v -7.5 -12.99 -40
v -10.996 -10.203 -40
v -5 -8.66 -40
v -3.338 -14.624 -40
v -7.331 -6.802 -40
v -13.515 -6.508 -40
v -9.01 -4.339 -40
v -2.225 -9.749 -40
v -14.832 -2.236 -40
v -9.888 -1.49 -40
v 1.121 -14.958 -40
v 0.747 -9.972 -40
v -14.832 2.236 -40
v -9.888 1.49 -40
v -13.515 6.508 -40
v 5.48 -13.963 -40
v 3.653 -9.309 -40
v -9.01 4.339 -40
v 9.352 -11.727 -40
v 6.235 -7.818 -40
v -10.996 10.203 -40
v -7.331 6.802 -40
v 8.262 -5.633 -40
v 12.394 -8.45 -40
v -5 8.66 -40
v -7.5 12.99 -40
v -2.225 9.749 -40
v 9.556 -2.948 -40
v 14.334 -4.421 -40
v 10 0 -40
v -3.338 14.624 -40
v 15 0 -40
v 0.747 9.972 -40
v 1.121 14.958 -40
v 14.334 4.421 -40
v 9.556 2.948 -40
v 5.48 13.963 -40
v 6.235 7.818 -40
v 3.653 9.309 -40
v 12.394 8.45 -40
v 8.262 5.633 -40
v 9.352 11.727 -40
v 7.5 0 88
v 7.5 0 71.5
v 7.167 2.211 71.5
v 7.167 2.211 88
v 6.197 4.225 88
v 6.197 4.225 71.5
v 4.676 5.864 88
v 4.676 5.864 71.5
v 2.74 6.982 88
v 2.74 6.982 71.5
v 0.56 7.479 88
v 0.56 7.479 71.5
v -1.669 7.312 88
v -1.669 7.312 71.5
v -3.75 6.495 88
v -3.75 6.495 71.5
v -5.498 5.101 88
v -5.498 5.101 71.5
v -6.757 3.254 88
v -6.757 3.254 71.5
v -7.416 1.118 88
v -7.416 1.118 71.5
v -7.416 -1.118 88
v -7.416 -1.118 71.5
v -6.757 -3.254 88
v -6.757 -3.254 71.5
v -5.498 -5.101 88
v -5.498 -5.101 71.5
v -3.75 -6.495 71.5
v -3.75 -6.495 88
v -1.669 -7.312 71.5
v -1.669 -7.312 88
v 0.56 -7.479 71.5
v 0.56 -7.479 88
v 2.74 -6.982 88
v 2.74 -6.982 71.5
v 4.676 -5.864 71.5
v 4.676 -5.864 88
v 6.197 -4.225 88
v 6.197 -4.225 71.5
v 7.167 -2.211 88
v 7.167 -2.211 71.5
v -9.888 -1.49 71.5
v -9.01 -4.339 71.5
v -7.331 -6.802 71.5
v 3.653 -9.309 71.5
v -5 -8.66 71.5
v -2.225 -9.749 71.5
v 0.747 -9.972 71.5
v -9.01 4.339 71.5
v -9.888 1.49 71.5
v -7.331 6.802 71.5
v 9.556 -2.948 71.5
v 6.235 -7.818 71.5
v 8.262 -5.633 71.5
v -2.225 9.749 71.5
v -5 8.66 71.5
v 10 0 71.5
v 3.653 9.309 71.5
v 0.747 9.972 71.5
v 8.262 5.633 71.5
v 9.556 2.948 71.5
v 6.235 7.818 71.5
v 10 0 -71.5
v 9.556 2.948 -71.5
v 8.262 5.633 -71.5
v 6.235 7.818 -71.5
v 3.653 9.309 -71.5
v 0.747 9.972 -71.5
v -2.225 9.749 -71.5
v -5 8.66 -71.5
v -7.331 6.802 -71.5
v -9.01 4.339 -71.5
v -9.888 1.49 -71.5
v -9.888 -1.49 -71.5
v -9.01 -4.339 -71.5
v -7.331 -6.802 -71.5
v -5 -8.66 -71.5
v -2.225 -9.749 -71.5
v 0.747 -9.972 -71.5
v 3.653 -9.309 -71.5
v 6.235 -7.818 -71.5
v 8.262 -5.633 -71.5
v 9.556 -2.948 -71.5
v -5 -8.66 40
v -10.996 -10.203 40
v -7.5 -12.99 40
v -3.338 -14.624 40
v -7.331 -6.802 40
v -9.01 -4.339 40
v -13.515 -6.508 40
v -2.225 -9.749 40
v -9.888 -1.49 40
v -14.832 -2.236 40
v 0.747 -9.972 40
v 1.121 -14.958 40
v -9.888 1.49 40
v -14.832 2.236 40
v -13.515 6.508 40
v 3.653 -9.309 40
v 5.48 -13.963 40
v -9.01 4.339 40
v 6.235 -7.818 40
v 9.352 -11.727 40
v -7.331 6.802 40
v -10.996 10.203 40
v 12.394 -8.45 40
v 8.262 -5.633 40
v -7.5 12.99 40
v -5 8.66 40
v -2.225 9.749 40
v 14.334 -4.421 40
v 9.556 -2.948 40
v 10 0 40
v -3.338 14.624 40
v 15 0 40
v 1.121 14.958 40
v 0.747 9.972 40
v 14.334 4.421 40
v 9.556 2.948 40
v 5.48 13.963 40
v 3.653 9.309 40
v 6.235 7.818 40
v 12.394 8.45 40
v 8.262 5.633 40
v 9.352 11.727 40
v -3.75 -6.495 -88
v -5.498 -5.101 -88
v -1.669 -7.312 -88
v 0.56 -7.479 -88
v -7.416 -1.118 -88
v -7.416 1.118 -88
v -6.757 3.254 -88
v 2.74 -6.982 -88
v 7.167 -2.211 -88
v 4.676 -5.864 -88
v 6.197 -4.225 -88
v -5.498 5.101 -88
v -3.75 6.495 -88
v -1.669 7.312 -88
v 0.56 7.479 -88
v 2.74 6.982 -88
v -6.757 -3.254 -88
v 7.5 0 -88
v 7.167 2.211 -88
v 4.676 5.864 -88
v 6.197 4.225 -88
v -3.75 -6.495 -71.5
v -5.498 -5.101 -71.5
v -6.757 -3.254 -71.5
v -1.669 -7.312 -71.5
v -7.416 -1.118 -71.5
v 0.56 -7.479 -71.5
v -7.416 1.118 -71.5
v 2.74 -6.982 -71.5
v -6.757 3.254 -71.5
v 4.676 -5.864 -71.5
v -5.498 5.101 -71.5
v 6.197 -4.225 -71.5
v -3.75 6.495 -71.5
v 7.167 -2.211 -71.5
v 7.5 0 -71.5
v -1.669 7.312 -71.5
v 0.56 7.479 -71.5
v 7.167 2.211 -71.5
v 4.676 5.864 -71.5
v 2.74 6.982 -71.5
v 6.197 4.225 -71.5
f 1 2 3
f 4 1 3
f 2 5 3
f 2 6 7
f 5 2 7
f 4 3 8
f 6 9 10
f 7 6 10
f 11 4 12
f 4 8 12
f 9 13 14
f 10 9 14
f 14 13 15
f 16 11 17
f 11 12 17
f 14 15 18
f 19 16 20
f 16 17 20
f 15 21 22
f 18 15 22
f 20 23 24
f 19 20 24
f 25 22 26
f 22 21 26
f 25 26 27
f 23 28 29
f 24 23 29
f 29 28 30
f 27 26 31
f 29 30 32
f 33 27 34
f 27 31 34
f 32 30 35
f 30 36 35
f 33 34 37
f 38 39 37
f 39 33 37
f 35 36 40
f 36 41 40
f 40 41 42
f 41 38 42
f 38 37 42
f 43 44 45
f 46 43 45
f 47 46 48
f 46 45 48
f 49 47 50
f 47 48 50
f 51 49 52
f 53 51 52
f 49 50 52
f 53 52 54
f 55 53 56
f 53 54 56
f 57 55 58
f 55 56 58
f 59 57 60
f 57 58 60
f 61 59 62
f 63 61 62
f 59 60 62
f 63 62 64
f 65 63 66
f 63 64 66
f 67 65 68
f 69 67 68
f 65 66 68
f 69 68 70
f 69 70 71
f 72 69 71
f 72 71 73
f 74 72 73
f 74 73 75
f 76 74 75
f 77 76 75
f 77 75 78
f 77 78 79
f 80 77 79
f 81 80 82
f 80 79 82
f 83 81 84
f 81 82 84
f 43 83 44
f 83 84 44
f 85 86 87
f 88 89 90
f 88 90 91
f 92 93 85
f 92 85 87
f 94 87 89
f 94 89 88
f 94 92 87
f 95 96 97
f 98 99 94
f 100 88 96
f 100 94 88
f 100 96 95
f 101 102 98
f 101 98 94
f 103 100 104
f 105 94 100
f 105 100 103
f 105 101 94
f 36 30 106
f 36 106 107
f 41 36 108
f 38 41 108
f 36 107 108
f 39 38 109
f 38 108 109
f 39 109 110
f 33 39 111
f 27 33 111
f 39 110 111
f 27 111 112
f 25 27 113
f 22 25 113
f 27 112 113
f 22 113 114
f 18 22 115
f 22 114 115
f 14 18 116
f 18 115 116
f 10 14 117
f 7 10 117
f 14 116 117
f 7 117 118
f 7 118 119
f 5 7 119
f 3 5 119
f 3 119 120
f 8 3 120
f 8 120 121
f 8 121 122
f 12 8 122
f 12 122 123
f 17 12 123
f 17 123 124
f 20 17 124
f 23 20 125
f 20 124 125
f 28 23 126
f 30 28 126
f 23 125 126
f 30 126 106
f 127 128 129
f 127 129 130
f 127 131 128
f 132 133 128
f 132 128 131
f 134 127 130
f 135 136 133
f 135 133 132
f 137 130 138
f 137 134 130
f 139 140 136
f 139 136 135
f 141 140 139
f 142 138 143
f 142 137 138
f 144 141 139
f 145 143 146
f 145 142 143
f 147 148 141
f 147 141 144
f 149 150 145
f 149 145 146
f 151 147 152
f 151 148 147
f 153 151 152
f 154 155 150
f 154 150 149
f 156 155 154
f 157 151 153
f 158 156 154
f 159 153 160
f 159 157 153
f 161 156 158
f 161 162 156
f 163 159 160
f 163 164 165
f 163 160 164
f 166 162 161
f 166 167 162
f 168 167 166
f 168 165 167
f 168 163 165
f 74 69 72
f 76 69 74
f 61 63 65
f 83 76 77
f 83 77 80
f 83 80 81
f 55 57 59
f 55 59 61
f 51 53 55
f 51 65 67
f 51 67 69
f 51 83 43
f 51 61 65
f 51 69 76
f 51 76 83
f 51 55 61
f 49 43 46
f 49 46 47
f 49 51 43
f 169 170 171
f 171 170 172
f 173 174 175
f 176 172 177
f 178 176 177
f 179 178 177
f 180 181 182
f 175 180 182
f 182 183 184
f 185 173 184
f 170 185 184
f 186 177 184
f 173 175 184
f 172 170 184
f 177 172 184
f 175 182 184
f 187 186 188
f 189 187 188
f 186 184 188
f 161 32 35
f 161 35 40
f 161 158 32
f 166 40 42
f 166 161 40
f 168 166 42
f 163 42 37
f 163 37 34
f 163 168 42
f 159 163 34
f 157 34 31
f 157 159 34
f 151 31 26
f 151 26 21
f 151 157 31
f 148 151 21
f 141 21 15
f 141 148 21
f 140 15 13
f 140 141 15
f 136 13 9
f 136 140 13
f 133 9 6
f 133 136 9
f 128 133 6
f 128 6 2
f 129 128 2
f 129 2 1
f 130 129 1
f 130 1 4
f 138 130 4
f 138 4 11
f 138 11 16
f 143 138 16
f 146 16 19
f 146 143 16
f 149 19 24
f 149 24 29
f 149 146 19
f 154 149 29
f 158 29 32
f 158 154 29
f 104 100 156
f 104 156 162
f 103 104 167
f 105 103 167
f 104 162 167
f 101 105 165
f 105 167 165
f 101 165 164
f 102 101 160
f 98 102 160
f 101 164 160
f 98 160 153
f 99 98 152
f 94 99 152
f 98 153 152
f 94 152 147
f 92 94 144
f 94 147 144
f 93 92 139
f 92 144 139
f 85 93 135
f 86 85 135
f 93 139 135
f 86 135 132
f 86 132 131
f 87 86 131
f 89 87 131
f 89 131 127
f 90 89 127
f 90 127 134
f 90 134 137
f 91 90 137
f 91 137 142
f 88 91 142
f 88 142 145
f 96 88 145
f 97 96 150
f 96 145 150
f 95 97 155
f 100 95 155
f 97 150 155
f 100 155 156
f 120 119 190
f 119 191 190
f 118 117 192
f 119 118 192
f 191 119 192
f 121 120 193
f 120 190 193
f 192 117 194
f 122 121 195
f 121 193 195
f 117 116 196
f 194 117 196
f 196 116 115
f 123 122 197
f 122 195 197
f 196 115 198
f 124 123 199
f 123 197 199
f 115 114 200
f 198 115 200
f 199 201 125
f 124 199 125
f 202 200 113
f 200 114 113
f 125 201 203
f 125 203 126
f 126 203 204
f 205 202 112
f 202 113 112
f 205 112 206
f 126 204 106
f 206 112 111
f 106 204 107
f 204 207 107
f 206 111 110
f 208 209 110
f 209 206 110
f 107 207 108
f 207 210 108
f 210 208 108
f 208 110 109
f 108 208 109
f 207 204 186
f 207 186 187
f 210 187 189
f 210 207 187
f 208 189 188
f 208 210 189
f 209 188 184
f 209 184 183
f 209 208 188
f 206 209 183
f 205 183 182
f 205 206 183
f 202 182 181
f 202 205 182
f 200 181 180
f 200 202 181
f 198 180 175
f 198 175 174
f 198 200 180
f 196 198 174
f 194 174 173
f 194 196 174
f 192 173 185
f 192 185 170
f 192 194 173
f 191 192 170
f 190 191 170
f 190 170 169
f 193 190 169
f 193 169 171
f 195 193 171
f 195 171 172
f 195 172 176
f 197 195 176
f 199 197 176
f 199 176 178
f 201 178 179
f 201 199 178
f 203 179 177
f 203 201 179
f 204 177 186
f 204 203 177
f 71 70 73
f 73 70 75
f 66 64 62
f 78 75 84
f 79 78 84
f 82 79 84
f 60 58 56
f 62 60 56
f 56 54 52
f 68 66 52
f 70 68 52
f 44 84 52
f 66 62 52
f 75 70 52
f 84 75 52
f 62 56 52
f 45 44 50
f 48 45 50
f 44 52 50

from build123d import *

# Parameters (mm, degrees)
ESQUISSE1_R        = 15
BOSS_EXTRU_1_DEPTH = 40
BOSS_EXTRU_5_START = 40
ESQUISSE1_10_R     = 10
BOSS_EXTRU_5_DEPTH = 31.5
BOSS_EXTRU_3_START = 71.5
ESQUISSE1_7_R      = 7.5
BOSS_EXTRU_3_DEPTH = 16.5
BOSS_EXTRU_4_START = -71.5
ESQUISSE1_8_R      = 7.5
BOSS_EXTRU_4_DEPTH = 16.5
BOSS_EXTRU_6_START = -71.5
ESQUISSE1_11_R     = 10
BOSS_EXTRU_6_DEPTH = 31.5


with BuildPart() as part:
    # Esquisse1 → Boss.-Extru.1 (new, symmetric)
    with BuildSketch(Plane.XY):
        Circle(ESQUISSE1_R)
    extrude(amount=BOSS_EXTRU_1_DEPTH, both=True)

    # Esquisse1<10> → Boss.-Extru.5 (add)
    with BuildSketch(Plane.XY.offset(BOSS_EXTRU_5_START)):
        Circle(ESQUISSE1_10_R)
    extrude(amount=BOSS_EXTRU_5_DEPTH)



with BuildPart() as body_2:
    # Esquisse1<7> → Boss.-Extru.3 (new body)
    with BuildSketch(Plane.XY.offset(BOSS_EXTRU_3_START)):
        Circle(ESQUISSE1_7_R)
    extrude(amount=BOSS_EXTRU_3_DEPTH)


with BuildPart() as body_3:
    # Esquisse1<8> → Boss.-Extru.4 (new body)
    with BuildSketch(Plane.XY.offset(BOSS_EXTRU_4_START)):
        Circle(ESQUISSE1_8_R)
    extrude(amount=-BOSS_EXTRU_4_DEPTH)


with BuildPart() as part_1:
    add(part.part)

    add(body_3.part)  # Boss.-Extru.6 merges body 3
    # Esquisse1<11> → Boss.-Extru.6 (add)
    with BuildSketch(Plane.XY.offset(BOSS_EXTRU_6_START)):
        Circle(ESQUISSE1_11_R)
    extrude(amount=BOSS_EXTRU_6_DEPTH)


solid = Compound([body_2.part, part_1.part])
